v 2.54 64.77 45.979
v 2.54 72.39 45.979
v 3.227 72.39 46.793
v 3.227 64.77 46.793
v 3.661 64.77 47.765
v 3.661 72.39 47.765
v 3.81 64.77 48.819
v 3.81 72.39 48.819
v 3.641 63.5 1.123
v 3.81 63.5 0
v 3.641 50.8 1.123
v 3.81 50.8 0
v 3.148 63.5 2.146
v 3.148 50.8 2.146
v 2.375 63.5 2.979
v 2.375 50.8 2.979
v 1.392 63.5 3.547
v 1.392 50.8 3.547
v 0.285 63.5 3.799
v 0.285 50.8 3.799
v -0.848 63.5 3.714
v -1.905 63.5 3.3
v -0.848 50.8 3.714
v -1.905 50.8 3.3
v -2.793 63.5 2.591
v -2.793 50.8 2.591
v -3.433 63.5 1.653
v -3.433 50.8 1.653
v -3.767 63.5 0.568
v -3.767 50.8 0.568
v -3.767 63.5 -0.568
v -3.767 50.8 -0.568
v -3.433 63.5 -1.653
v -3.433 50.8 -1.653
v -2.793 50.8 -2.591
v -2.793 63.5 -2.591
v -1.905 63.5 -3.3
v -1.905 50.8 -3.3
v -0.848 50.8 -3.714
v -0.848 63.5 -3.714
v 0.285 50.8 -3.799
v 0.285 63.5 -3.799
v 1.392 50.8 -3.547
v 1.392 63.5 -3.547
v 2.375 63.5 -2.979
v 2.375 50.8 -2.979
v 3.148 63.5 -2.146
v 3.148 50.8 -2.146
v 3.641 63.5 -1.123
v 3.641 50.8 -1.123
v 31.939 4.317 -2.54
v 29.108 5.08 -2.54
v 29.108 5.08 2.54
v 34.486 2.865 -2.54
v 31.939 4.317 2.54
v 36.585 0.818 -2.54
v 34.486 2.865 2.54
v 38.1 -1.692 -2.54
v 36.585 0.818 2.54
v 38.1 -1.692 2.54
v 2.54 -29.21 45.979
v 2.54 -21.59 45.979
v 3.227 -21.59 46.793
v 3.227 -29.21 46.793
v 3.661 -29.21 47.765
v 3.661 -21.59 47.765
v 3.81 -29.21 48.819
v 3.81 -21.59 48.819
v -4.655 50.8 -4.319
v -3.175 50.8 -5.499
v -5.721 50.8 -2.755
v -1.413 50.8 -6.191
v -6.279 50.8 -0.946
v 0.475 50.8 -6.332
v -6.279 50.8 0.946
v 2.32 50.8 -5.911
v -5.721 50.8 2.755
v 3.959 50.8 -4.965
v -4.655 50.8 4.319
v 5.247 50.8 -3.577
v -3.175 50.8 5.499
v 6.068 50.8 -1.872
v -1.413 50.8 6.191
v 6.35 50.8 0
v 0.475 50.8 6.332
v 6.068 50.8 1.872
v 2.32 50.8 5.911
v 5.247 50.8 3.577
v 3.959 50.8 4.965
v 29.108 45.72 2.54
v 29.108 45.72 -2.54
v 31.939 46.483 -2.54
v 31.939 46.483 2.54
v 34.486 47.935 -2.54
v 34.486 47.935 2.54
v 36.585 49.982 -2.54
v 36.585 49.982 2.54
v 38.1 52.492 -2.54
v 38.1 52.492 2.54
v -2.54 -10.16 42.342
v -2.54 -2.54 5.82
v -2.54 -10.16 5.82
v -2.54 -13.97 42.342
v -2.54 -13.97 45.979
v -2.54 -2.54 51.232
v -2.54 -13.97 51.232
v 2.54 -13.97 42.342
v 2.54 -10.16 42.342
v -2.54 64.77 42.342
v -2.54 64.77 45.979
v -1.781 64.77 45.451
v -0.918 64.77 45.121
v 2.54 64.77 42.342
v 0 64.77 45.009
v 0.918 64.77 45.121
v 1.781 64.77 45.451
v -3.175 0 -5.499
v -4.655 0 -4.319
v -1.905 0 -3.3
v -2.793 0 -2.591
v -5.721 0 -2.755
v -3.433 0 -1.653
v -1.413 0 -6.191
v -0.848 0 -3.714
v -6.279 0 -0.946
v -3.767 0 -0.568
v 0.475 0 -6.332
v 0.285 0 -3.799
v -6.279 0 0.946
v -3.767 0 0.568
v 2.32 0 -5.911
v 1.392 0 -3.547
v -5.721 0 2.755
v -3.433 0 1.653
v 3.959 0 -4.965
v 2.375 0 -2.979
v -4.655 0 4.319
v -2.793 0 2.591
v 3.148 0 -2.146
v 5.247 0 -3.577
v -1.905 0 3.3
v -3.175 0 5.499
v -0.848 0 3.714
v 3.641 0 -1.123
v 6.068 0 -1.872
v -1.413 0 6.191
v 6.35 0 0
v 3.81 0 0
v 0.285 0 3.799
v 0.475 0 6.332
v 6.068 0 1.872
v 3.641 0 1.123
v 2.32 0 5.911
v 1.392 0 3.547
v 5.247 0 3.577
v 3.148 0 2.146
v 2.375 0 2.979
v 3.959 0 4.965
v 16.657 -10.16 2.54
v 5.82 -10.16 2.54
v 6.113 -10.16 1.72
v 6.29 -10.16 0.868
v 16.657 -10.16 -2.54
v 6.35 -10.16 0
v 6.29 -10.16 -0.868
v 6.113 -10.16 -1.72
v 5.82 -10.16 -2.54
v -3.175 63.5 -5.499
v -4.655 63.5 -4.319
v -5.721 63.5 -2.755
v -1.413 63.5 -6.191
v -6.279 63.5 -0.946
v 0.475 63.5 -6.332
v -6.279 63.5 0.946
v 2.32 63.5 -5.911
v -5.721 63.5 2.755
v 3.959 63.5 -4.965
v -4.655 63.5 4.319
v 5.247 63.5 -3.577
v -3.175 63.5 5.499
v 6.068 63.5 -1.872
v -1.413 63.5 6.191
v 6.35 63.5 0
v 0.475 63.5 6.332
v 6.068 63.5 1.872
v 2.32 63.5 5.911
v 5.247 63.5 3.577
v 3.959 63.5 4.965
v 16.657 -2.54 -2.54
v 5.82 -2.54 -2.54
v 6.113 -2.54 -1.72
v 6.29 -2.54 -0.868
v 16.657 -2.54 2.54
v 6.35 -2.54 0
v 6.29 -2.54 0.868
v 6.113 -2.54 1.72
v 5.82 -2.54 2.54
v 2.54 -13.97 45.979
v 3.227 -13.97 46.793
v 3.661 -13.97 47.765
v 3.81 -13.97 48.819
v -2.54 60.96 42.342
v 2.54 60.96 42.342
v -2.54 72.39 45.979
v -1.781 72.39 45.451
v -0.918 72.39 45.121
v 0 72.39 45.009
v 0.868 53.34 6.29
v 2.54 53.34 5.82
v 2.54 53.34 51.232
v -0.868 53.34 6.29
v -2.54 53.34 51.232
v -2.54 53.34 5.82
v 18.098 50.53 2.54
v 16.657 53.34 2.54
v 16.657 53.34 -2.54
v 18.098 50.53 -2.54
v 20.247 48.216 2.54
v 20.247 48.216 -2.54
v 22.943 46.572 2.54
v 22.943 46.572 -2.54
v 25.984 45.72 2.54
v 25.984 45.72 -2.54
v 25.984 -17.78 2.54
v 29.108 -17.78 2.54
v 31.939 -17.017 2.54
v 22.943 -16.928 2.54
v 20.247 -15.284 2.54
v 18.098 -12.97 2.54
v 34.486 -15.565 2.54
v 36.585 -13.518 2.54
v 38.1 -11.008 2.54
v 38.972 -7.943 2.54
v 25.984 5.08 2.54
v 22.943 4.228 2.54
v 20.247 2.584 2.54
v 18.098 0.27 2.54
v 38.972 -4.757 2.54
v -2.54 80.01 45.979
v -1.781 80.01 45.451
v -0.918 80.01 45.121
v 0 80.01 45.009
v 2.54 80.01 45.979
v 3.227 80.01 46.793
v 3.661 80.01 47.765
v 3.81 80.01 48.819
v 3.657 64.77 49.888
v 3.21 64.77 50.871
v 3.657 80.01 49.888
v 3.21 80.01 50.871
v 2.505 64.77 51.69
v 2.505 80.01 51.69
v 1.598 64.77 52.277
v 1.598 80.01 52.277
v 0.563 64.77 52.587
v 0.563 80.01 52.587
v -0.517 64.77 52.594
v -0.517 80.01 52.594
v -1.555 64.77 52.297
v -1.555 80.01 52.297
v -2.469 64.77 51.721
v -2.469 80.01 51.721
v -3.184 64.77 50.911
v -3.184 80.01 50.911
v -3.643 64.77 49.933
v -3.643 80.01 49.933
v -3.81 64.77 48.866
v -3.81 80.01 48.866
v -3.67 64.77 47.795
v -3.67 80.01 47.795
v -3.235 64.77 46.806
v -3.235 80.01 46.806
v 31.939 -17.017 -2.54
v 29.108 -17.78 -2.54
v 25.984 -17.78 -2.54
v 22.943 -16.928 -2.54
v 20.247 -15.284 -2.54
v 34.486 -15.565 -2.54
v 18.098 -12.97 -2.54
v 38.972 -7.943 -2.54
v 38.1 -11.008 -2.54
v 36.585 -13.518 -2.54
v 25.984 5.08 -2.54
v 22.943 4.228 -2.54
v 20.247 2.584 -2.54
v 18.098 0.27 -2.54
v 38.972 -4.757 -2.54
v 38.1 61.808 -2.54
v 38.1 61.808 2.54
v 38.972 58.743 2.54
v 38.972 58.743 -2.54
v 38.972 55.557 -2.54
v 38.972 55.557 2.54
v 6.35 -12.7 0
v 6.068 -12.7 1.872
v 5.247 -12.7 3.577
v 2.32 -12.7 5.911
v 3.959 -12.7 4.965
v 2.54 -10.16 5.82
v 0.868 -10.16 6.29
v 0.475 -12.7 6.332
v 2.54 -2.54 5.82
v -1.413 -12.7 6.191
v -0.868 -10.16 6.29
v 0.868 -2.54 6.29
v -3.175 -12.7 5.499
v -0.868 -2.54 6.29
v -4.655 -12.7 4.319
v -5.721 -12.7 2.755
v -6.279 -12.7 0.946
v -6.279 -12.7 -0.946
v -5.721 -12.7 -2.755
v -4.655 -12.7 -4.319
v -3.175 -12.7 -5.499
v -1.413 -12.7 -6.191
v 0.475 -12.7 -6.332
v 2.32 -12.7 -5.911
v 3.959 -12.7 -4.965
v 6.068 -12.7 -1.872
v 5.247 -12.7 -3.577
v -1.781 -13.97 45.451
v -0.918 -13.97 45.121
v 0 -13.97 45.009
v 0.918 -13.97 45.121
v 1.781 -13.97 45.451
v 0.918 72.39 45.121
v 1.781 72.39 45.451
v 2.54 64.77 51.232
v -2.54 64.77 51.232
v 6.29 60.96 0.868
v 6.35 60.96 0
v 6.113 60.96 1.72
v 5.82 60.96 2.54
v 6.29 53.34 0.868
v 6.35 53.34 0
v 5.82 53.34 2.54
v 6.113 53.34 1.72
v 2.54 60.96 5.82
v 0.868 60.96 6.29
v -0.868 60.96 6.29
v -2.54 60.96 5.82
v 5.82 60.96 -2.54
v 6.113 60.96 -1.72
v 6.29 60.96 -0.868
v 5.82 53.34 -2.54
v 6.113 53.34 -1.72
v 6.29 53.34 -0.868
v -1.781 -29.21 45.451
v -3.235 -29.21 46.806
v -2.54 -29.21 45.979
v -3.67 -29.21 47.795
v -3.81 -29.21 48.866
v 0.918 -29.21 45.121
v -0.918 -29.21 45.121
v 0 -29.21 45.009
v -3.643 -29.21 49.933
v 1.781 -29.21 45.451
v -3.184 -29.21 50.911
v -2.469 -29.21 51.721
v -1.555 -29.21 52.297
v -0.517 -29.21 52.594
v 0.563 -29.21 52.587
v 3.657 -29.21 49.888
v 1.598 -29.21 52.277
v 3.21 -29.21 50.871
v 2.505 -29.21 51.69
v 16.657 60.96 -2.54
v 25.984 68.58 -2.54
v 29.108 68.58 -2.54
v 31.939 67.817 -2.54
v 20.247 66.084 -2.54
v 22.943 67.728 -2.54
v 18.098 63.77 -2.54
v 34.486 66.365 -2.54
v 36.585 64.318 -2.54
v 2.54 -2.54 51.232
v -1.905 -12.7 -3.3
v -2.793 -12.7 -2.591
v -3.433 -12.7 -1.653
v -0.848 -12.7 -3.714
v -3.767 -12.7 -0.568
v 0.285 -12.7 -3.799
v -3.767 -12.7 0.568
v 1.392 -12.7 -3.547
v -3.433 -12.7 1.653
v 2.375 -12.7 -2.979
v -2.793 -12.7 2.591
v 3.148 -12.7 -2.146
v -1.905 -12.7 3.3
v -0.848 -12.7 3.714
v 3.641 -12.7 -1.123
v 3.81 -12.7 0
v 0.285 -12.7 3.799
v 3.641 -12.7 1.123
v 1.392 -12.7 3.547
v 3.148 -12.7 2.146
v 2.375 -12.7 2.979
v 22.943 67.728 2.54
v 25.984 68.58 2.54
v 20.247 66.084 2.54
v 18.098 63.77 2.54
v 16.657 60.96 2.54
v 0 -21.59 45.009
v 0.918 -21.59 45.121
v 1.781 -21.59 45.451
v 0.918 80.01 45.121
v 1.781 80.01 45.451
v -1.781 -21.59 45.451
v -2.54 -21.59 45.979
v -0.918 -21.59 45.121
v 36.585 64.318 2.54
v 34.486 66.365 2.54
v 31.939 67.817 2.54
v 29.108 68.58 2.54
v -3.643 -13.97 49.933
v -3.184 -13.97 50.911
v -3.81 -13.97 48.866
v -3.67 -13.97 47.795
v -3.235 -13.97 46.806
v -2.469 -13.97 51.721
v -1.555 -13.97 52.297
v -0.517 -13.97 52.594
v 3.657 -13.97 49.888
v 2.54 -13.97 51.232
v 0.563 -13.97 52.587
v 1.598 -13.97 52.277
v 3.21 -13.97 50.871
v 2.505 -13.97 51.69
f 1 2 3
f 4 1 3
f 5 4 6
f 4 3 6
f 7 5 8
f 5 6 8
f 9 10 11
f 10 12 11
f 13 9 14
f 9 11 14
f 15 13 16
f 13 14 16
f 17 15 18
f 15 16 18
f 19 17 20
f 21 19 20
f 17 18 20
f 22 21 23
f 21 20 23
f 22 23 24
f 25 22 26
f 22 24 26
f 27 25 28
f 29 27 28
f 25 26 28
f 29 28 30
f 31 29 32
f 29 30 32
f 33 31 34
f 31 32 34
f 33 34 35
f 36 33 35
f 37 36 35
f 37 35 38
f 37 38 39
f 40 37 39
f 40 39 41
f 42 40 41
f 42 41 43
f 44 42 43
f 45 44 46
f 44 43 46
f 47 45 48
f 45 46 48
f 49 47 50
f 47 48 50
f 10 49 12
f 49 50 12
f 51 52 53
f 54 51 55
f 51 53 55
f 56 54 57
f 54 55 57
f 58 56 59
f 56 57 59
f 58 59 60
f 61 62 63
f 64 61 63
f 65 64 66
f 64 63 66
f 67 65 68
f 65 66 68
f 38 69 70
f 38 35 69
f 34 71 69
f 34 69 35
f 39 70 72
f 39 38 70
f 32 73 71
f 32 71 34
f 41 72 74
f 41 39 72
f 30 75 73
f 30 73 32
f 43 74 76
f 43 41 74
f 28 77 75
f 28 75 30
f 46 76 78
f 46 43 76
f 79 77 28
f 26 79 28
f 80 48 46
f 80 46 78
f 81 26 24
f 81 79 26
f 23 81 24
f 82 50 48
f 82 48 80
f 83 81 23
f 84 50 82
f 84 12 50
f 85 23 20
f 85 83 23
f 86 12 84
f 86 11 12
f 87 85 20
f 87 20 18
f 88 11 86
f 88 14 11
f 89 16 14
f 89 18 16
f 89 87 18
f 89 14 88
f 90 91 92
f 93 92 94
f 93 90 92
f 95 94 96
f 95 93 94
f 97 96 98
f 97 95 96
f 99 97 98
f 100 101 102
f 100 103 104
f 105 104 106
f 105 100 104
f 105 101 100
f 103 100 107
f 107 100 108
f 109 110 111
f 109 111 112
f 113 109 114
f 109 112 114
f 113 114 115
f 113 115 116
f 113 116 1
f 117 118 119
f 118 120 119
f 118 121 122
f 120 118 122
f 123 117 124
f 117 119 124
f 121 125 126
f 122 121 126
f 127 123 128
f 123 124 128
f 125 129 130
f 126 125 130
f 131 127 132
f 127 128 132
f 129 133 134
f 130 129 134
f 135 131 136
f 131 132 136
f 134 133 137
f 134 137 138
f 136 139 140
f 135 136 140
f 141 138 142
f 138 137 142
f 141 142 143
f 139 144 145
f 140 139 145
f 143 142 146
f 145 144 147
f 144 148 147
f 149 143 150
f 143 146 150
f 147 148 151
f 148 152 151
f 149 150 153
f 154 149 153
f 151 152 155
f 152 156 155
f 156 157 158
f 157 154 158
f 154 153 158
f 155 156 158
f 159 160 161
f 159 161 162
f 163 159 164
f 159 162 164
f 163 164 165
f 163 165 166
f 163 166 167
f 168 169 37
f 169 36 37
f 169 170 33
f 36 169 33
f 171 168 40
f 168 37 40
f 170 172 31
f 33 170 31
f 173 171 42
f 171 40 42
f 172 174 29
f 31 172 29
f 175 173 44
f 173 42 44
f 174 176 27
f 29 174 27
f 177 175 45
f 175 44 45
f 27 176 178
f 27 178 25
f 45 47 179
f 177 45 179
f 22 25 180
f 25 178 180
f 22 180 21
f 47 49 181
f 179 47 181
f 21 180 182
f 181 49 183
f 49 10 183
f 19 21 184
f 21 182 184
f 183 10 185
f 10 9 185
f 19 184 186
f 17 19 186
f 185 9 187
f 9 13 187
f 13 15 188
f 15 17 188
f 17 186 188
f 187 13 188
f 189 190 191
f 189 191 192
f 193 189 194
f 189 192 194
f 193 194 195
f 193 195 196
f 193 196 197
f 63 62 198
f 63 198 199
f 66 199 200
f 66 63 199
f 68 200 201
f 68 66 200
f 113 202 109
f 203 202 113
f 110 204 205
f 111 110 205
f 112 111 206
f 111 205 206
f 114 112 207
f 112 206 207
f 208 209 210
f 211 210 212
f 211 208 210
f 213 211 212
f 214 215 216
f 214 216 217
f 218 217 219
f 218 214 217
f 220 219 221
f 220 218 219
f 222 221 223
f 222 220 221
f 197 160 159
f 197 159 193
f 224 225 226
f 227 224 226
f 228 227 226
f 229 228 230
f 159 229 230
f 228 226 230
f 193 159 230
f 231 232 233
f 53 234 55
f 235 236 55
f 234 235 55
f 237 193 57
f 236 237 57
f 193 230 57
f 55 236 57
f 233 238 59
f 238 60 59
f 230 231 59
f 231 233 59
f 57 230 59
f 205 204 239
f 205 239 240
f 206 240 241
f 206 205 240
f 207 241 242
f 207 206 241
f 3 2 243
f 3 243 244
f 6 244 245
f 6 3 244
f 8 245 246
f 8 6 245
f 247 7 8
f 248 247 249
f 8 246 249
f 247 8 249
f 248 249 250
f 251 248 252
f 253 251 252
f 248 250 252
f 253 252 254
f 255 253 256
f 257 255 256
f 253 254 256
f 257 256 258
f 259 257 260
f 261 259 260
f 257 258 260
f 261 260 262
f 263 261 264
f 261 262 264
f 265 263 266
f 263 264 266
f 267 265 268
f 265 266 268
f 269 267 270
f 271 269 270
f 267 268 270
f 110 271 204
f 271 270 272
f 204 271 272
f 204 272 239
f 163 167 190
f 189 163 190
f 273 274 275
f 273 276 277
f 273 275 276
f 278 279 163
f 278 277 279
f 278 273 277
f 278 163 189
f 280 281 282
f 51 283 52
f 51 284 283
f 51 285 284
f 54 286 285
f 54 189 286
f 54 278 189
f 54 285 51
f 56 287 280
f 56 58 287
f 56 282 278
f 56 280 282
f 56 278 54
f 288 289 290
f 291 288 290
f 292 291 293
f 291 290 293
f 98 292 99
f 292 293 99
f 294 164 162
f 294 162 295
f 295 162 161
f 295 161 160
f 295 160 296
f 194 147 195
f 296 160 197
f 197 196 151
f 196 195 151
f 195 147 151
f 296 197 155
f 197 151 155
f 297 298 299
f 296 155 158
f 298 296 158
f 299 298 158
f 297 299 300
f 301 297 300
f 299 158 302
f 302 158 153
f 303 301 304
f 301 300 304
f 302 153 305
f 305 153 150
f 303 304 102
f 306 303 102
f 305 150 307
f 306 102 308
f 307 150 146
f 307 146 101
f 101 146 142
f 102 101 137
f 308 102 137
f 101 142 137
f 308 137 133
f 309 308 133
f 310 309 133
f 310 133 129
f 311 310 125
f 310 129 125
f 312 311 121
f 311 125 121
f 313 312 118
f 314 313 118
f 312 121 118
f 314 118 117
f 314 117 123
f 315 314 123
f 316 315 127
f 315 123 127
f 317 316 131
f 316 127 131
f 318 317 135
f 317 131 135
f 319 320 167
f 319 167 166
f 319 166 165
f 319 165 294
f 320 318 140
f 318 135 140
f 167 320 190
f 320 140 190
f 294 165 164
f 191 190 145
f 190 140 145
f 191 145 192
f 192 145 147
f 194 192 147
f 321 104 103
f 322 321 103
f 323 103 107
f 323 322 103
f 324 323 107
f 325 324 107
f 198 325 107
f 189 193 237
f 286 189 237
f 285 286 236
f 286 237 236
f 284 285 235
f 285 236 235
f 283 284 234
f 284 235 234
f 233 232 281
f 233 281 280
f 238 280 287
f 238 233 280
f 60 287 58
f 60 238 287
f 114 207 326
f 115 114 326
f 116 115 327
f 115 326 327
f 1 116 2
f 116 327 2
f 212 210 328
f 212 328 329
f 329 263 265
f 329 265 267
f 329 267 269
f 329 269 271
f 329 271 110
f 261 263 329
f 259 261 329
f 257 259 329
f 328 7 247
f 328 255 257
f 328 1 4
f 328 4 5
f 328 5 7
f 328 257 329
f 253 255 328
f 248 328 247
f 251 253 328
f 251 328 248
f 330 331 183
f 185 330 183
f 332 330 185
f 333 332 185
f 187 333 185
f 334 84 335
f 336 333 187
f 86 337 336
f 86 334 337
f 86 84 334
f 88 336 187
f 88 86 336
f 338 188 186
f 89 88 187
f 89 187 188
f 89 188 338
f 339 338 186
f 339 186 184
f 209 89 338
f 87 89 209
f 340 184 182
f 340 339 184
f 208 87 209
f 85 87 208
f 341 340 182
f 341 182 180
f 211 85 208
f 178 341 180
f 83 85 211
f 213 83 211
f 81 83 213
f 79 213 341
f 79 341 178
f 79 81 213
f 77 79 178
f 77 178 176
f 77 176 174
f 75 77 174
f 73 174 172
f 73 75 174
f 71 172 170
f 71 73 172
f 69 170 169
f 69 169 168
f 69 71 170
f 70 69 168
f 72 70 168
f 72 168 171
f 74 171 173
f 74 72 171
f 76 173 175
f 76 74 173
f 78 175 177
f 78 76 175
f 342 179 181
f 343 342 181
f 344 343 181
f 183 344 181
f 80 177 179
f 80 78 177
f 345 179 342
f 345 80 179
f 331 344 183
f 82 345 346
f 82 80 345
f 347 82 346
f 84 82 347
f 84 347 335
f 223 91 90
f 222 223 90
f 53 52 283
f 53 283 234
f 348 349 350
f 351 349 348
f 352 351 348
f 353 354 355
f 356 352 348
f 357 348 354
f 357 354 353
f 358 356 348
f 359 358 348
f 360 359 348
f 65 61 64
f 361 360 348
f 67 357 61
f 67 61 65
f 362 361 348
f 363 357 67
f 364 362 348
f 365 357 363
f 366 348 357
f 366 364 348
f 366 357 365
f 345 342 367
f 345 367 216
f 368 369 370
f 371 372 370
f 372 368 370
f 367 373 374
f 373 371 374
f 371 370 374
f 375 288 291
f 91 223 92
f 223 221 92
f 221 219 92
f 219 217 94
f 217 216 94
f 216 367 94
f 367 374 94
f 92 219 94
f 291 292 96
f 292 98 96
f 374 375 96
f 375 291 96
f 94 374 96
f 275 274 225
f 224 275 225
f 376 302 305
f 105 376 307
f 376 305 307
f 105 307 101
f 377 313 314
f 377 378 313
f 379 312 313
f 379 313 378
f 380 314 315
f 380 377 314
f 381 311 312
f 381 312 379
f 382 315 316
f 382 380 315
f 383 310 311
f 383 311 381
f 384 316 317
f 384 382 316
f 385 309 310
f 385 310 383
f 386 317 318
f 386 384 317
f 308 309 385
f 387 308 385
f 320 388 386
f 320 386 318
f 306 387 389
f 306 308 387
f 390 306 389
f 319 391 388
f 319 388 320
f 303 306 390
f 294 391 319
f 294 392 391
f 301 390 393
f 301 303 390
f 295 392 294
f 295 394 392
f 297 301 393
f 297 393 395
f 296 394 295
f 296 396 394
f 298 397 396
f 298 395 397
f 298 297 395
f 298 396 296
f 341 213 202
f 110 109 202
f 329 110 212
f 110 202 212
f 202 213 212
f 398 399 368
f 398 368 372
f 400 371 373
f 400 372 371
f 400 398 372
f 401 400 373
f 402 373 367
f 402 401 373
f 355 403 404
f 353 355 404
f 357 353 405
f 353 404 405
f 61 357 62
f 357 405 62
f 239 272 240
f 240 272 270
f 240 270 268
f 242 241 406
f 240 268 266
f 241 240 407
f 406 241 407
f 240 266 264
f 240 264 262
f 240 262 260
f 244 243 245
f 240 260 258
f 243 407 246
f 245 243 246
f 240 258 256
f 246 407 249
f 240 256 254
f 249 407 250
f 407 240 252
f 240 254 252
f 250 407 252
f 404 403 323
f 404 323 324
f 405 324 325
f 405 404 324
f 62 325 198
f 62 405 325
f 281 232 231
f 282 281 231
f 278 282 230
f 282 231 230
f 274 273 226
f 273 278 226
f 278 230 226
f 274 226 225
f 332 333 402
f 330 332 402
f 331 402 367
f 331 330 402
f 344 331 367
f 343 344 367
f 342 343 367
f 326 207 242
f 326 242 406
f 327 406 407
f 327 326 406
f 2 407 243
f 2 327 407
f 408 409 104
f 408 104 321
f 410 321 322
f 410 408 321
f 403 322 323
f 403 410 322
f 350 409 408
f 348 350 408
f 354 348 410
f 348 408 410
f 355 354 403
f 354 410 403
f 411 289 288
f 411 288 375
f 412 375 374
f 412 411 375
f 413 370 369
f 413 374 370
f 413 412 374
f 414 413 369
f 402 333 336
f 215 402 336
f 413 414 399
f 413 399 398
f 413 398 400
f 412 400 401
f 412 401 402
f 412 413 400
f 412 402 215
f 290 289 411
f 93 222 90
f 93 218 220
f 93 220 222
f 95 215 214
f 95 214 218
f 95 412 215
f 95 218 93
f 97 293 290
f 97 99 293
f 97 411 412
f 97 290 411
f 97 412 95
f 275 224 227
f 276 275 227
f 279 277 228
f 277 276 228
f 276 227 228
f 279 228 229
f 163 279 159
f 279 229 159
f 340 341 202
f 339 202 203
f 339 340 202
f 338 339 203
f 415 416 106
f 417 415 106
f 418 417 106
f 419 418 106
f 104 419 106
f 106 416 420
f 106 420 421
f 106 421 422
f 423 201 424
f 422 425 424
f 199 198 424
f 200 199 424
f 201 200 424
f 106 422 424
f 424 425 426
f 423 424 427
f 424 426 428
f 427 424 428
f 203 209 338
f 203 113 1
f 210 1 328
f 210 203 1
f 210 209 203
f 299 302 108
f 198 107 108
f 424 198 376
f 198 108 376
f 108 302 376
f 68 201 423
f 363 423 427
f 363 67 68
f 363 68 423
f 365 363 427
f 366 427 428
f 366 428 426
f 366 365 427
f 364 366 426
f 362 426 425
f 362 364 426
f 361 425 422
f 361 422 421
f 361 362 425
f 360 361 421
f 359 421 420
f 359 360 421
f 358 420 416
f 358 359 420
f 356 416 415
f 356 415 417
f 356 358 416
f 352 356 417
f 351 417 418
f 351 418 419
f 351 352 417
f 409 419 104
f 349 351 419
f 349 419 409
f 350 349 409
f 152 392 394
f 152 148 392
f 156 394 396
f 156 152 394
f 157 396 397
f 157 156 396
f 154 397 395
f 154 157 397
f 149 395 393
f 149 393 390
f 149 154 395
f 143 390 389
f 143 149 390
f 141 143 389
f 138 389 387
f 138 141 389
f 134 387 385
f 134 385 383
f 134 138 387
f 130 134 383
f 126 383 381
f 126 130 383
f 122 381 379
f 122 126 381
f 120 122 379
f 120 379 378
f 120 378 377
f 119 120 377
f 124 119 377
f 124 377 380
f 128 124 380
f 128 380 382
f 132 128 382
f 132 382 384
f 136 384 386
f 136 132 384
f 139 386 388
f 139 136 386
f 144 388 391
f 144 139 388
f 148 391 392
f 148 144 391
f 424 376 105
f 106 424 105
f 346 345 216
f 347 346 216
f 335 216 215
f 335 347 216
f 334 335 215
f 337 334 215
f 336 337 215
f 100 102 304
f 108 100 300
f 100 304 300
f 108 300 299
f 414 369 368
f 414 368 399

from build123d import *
from build123d import SkipClean  # not in build123d's __all__

# Parameters (mm, degrees)
F0_R           = 6.35
F0_R_2         = 3.81
F1_DEPTH       = 12.7
F4_DEPTH       = 38.1
F5_DEPTH       = 25.4
F5_DEPTH_BACK  = 25.4
F6_W           = 13.8230553448
F6_H           = 5.08
F7_DEPTH       = 7.62
F7_DEPTH_BACK  = 15.24
F8_DEPTH       = 7.62
F9_DEPTH       = 7.62
F11_DEPTH      = 25.4
F12_DEPTH      = 5.08
F14_DEPTH      = 51.2318
F15_DEPTH      = 25.4
F16_W          = 2.54
F16_H          = 8.89
F17_DEPTH      = 11.43
F19_DEPTH      = 7.62
F19_DEPTH_BACK = 7.62
F20_DEPTH      = 7.62


with BuildPart() as f1:
    # F0 (on Front) → F1 (new body)
    with BuildSketch(Plane.XZ):
        Circle(F0_R)
        Circle(F0_R_2, mode=Mode.SUBTRACT)
    extrude(amount=F1_DEPTH)

    # F3 (on Right) → F4 (join)
    with BuildSketch(Plane.YZ):
        Polygon((-2.54, -2.54), (-2.54, 0), (-2.54, 2.54), (-10.16, 2.54), (-10.16, 0), (-10.16, -2.54), align=None)
    extrude(amount=F4_DEPTH)

    # F0 (on Front) → F5 (cut, two sides)
    with BuildSketch(Plane.XZ) as f5_sk:
        Circle(F0_R_2)
    extrude(amount=F5_DEPTH, mode=Mode.SUBTRACT)
    extrude(f5_sk.sketch, amount=-F5_DEPTH_BACK, mode=Mode.SUBTRACT)

    # F6 (on face) → F7 (join, two sides)
    with BuildSketch(Plane.XZ.offset(10.16)) as f7_sk:
        with Locations((31.1884723276, 0)):
            Rectangle(F6_W, F6_H)
    extrude(amount=F7_DEPTH)
    extrude(f7_sk.sketch, amount=-F7_DEPTH_BACK)

    # F8 (add): a face of the model
    f8_faces = [f1.faces().sort_by_distance(p)[0] for p in [
        (24.2769446552, -13.97, 0),
    ]]
    extrude(f8_faces, amount=F8_DEPTH)

    # F9 (add): a face of the model
    f9_faces = [f1.faces().sort_by_distance(p)[0] for p in [
        (24.2769446552, 1.27, 0),
    ]]
    extrude(f9_faces, amount=F9_DEPTH)

    # F10 (on face) → F11 (cut)
    with BuildSketch(Plane.XY.offset(2.54)):
        with BuildLine():
            ThreePointArc((25.9835010893, -17.78), (20.2469210754, -15.2836758241), (16.6569446552, -10.16))
            Line((16.6569446552, -10.16), (16.6569446552, -17.78))
            Line((16.6569446552, -17.78), (25.9835010893, -17.78))
        make_face()
        with BuildLine():
            Line((16.6569446552, 5.08), (16.6569446552, -2.54))
            ThreePointArc((16.6569446552, -2.54), (20.2469210754, 2.5836758241), (25.9835010893, 5.08))
            Line((25.9835010893, 5.08), (16.6569446552, 5.08))
        make_face()
        with BuildLine():
            Line((38.1, 5.08), (29.1083570088, 5.08))
            ThreePointArc((29.1083570088, 5.08), (34.4861831348, 2.8651480918), (38.1, -1.6919244863))
            Line((38.1, -1.6919244863), (38.1, 5.08))
        make_face()
        with BuildLine():
            Line((38.1, -17.78), (38.1, -11.0080755137))
            ThreePointArc((38.1, -11.0080755137), (34.4861831348, -15.5651480918), (29.1083570088, -17.78))
            Line((29.1083570088, -17.78), (38.1, -17.78))
        make_face()
    extrude(amount=-F11_DEPTH, mode=Mode.SUBTRACT)

    # F10 (on face) → F12 (join)
    with BuildSketch(Plane.XY.offset(2.54)):
        with BuildLine():
            ThreePointArc((38.1, -11.0080755137), (39.0822231303, -6.35), (38.1, -1.6919244863))
            Line((38.1, -1.6919244863), (38.1, -11.0080755137))
        make_face()
    with SkipClean():  # cleaning this boolean's faces spoils the solid; the shape is the same uncleaned
        extrude(amount=-F12_DEPTH)

    # F13 (on Top) → F14 (join)
    with BuildSketch(Plane.XY):
        Polygon((2.54, -2.54), (0, -2.54), (-2.54, -2.54), (-2.54, -10.16), (0, -10.16), (2.54, -10.16), align=None)
    extrude(amount=F14_DEPTH)

    # F0 (on Front) → F15 (cut)
    with BuildSketch(Plane.XZ):
        Circle(F0_R_2)
    extrude(amount=F15_DEPTH, mode=Mode.SUBTRACT)

    # F16 (on face) → F17 (join)
    with BuildSketch(Plane.XZ.offset(10.16)):
        with Locations((-1.27, 46.7868)):
            Rectangle(F16_W, F16_H)
        with Locations((1.27, 46.7868)):
            Rectangle(F16_W, F16_H)
    extrude(amount=F17_DEPTH)

    # F18 (on face) → F19 (join, two sides)
    with BuildSketch(Plane.XZ.offset(21.59)) as f19_sk:
        with BuildLine():
            Line((-2.54, 51.2318), (-2.54, 45.9789936686))
            ThreePointArc((-2.54, 45.9789936686), (-1.359492162, 45.2596033124), (0, 45.0088))
            ThreePointArc((0, 45.0088), (1.359492162, 45.2596033124), (2.54, 45.9789936686))
            Line((2.54, 45.9789936686), (2.54, 51.2318))
            Line((2.54, 51.2318), (-2.54, 51.2318))
        make_face()
        with BuildLine():
            ThreePointArc((2.54, 45.9789936686), (3.4780382402, 47.2633740133), (3.81, 48.8188))
            ThreePointArc((3.81, 48.8188), (-1.5554259867, 52.2968382402), (-2.54, 45.9789936686))
            Line((-2.54, 45.9789936686), (-2.54, 51.2318))
            Line((-2.54, 51.2318), (2.54, 51.2318))
            Line((2.54, 51.2318), (2.54, 45.9789936686))
        make_face()
    extrude(amount=F19_DEPTH)
    extrude(f19_sk.sketch, amount=-F19_DEPTH_BACK)

    # F20 (cut): a face of the model
    f20_faces = [f1.faces().sort_by_distance(p)[0] for p in [
        (0, -21.59, 43.8411826896),
    ]]
    extrude(f20_faces, amount=-F20_DEPTH, mode=Mode.SUBTRACT)


with BuildPart() as f22_1:
    # F22: instance of F1
    add(f1.part.mirror(Plane.XZ.offset(-25.4)), clean=False)


solid = Compound([f1.part, f22_1.part])
